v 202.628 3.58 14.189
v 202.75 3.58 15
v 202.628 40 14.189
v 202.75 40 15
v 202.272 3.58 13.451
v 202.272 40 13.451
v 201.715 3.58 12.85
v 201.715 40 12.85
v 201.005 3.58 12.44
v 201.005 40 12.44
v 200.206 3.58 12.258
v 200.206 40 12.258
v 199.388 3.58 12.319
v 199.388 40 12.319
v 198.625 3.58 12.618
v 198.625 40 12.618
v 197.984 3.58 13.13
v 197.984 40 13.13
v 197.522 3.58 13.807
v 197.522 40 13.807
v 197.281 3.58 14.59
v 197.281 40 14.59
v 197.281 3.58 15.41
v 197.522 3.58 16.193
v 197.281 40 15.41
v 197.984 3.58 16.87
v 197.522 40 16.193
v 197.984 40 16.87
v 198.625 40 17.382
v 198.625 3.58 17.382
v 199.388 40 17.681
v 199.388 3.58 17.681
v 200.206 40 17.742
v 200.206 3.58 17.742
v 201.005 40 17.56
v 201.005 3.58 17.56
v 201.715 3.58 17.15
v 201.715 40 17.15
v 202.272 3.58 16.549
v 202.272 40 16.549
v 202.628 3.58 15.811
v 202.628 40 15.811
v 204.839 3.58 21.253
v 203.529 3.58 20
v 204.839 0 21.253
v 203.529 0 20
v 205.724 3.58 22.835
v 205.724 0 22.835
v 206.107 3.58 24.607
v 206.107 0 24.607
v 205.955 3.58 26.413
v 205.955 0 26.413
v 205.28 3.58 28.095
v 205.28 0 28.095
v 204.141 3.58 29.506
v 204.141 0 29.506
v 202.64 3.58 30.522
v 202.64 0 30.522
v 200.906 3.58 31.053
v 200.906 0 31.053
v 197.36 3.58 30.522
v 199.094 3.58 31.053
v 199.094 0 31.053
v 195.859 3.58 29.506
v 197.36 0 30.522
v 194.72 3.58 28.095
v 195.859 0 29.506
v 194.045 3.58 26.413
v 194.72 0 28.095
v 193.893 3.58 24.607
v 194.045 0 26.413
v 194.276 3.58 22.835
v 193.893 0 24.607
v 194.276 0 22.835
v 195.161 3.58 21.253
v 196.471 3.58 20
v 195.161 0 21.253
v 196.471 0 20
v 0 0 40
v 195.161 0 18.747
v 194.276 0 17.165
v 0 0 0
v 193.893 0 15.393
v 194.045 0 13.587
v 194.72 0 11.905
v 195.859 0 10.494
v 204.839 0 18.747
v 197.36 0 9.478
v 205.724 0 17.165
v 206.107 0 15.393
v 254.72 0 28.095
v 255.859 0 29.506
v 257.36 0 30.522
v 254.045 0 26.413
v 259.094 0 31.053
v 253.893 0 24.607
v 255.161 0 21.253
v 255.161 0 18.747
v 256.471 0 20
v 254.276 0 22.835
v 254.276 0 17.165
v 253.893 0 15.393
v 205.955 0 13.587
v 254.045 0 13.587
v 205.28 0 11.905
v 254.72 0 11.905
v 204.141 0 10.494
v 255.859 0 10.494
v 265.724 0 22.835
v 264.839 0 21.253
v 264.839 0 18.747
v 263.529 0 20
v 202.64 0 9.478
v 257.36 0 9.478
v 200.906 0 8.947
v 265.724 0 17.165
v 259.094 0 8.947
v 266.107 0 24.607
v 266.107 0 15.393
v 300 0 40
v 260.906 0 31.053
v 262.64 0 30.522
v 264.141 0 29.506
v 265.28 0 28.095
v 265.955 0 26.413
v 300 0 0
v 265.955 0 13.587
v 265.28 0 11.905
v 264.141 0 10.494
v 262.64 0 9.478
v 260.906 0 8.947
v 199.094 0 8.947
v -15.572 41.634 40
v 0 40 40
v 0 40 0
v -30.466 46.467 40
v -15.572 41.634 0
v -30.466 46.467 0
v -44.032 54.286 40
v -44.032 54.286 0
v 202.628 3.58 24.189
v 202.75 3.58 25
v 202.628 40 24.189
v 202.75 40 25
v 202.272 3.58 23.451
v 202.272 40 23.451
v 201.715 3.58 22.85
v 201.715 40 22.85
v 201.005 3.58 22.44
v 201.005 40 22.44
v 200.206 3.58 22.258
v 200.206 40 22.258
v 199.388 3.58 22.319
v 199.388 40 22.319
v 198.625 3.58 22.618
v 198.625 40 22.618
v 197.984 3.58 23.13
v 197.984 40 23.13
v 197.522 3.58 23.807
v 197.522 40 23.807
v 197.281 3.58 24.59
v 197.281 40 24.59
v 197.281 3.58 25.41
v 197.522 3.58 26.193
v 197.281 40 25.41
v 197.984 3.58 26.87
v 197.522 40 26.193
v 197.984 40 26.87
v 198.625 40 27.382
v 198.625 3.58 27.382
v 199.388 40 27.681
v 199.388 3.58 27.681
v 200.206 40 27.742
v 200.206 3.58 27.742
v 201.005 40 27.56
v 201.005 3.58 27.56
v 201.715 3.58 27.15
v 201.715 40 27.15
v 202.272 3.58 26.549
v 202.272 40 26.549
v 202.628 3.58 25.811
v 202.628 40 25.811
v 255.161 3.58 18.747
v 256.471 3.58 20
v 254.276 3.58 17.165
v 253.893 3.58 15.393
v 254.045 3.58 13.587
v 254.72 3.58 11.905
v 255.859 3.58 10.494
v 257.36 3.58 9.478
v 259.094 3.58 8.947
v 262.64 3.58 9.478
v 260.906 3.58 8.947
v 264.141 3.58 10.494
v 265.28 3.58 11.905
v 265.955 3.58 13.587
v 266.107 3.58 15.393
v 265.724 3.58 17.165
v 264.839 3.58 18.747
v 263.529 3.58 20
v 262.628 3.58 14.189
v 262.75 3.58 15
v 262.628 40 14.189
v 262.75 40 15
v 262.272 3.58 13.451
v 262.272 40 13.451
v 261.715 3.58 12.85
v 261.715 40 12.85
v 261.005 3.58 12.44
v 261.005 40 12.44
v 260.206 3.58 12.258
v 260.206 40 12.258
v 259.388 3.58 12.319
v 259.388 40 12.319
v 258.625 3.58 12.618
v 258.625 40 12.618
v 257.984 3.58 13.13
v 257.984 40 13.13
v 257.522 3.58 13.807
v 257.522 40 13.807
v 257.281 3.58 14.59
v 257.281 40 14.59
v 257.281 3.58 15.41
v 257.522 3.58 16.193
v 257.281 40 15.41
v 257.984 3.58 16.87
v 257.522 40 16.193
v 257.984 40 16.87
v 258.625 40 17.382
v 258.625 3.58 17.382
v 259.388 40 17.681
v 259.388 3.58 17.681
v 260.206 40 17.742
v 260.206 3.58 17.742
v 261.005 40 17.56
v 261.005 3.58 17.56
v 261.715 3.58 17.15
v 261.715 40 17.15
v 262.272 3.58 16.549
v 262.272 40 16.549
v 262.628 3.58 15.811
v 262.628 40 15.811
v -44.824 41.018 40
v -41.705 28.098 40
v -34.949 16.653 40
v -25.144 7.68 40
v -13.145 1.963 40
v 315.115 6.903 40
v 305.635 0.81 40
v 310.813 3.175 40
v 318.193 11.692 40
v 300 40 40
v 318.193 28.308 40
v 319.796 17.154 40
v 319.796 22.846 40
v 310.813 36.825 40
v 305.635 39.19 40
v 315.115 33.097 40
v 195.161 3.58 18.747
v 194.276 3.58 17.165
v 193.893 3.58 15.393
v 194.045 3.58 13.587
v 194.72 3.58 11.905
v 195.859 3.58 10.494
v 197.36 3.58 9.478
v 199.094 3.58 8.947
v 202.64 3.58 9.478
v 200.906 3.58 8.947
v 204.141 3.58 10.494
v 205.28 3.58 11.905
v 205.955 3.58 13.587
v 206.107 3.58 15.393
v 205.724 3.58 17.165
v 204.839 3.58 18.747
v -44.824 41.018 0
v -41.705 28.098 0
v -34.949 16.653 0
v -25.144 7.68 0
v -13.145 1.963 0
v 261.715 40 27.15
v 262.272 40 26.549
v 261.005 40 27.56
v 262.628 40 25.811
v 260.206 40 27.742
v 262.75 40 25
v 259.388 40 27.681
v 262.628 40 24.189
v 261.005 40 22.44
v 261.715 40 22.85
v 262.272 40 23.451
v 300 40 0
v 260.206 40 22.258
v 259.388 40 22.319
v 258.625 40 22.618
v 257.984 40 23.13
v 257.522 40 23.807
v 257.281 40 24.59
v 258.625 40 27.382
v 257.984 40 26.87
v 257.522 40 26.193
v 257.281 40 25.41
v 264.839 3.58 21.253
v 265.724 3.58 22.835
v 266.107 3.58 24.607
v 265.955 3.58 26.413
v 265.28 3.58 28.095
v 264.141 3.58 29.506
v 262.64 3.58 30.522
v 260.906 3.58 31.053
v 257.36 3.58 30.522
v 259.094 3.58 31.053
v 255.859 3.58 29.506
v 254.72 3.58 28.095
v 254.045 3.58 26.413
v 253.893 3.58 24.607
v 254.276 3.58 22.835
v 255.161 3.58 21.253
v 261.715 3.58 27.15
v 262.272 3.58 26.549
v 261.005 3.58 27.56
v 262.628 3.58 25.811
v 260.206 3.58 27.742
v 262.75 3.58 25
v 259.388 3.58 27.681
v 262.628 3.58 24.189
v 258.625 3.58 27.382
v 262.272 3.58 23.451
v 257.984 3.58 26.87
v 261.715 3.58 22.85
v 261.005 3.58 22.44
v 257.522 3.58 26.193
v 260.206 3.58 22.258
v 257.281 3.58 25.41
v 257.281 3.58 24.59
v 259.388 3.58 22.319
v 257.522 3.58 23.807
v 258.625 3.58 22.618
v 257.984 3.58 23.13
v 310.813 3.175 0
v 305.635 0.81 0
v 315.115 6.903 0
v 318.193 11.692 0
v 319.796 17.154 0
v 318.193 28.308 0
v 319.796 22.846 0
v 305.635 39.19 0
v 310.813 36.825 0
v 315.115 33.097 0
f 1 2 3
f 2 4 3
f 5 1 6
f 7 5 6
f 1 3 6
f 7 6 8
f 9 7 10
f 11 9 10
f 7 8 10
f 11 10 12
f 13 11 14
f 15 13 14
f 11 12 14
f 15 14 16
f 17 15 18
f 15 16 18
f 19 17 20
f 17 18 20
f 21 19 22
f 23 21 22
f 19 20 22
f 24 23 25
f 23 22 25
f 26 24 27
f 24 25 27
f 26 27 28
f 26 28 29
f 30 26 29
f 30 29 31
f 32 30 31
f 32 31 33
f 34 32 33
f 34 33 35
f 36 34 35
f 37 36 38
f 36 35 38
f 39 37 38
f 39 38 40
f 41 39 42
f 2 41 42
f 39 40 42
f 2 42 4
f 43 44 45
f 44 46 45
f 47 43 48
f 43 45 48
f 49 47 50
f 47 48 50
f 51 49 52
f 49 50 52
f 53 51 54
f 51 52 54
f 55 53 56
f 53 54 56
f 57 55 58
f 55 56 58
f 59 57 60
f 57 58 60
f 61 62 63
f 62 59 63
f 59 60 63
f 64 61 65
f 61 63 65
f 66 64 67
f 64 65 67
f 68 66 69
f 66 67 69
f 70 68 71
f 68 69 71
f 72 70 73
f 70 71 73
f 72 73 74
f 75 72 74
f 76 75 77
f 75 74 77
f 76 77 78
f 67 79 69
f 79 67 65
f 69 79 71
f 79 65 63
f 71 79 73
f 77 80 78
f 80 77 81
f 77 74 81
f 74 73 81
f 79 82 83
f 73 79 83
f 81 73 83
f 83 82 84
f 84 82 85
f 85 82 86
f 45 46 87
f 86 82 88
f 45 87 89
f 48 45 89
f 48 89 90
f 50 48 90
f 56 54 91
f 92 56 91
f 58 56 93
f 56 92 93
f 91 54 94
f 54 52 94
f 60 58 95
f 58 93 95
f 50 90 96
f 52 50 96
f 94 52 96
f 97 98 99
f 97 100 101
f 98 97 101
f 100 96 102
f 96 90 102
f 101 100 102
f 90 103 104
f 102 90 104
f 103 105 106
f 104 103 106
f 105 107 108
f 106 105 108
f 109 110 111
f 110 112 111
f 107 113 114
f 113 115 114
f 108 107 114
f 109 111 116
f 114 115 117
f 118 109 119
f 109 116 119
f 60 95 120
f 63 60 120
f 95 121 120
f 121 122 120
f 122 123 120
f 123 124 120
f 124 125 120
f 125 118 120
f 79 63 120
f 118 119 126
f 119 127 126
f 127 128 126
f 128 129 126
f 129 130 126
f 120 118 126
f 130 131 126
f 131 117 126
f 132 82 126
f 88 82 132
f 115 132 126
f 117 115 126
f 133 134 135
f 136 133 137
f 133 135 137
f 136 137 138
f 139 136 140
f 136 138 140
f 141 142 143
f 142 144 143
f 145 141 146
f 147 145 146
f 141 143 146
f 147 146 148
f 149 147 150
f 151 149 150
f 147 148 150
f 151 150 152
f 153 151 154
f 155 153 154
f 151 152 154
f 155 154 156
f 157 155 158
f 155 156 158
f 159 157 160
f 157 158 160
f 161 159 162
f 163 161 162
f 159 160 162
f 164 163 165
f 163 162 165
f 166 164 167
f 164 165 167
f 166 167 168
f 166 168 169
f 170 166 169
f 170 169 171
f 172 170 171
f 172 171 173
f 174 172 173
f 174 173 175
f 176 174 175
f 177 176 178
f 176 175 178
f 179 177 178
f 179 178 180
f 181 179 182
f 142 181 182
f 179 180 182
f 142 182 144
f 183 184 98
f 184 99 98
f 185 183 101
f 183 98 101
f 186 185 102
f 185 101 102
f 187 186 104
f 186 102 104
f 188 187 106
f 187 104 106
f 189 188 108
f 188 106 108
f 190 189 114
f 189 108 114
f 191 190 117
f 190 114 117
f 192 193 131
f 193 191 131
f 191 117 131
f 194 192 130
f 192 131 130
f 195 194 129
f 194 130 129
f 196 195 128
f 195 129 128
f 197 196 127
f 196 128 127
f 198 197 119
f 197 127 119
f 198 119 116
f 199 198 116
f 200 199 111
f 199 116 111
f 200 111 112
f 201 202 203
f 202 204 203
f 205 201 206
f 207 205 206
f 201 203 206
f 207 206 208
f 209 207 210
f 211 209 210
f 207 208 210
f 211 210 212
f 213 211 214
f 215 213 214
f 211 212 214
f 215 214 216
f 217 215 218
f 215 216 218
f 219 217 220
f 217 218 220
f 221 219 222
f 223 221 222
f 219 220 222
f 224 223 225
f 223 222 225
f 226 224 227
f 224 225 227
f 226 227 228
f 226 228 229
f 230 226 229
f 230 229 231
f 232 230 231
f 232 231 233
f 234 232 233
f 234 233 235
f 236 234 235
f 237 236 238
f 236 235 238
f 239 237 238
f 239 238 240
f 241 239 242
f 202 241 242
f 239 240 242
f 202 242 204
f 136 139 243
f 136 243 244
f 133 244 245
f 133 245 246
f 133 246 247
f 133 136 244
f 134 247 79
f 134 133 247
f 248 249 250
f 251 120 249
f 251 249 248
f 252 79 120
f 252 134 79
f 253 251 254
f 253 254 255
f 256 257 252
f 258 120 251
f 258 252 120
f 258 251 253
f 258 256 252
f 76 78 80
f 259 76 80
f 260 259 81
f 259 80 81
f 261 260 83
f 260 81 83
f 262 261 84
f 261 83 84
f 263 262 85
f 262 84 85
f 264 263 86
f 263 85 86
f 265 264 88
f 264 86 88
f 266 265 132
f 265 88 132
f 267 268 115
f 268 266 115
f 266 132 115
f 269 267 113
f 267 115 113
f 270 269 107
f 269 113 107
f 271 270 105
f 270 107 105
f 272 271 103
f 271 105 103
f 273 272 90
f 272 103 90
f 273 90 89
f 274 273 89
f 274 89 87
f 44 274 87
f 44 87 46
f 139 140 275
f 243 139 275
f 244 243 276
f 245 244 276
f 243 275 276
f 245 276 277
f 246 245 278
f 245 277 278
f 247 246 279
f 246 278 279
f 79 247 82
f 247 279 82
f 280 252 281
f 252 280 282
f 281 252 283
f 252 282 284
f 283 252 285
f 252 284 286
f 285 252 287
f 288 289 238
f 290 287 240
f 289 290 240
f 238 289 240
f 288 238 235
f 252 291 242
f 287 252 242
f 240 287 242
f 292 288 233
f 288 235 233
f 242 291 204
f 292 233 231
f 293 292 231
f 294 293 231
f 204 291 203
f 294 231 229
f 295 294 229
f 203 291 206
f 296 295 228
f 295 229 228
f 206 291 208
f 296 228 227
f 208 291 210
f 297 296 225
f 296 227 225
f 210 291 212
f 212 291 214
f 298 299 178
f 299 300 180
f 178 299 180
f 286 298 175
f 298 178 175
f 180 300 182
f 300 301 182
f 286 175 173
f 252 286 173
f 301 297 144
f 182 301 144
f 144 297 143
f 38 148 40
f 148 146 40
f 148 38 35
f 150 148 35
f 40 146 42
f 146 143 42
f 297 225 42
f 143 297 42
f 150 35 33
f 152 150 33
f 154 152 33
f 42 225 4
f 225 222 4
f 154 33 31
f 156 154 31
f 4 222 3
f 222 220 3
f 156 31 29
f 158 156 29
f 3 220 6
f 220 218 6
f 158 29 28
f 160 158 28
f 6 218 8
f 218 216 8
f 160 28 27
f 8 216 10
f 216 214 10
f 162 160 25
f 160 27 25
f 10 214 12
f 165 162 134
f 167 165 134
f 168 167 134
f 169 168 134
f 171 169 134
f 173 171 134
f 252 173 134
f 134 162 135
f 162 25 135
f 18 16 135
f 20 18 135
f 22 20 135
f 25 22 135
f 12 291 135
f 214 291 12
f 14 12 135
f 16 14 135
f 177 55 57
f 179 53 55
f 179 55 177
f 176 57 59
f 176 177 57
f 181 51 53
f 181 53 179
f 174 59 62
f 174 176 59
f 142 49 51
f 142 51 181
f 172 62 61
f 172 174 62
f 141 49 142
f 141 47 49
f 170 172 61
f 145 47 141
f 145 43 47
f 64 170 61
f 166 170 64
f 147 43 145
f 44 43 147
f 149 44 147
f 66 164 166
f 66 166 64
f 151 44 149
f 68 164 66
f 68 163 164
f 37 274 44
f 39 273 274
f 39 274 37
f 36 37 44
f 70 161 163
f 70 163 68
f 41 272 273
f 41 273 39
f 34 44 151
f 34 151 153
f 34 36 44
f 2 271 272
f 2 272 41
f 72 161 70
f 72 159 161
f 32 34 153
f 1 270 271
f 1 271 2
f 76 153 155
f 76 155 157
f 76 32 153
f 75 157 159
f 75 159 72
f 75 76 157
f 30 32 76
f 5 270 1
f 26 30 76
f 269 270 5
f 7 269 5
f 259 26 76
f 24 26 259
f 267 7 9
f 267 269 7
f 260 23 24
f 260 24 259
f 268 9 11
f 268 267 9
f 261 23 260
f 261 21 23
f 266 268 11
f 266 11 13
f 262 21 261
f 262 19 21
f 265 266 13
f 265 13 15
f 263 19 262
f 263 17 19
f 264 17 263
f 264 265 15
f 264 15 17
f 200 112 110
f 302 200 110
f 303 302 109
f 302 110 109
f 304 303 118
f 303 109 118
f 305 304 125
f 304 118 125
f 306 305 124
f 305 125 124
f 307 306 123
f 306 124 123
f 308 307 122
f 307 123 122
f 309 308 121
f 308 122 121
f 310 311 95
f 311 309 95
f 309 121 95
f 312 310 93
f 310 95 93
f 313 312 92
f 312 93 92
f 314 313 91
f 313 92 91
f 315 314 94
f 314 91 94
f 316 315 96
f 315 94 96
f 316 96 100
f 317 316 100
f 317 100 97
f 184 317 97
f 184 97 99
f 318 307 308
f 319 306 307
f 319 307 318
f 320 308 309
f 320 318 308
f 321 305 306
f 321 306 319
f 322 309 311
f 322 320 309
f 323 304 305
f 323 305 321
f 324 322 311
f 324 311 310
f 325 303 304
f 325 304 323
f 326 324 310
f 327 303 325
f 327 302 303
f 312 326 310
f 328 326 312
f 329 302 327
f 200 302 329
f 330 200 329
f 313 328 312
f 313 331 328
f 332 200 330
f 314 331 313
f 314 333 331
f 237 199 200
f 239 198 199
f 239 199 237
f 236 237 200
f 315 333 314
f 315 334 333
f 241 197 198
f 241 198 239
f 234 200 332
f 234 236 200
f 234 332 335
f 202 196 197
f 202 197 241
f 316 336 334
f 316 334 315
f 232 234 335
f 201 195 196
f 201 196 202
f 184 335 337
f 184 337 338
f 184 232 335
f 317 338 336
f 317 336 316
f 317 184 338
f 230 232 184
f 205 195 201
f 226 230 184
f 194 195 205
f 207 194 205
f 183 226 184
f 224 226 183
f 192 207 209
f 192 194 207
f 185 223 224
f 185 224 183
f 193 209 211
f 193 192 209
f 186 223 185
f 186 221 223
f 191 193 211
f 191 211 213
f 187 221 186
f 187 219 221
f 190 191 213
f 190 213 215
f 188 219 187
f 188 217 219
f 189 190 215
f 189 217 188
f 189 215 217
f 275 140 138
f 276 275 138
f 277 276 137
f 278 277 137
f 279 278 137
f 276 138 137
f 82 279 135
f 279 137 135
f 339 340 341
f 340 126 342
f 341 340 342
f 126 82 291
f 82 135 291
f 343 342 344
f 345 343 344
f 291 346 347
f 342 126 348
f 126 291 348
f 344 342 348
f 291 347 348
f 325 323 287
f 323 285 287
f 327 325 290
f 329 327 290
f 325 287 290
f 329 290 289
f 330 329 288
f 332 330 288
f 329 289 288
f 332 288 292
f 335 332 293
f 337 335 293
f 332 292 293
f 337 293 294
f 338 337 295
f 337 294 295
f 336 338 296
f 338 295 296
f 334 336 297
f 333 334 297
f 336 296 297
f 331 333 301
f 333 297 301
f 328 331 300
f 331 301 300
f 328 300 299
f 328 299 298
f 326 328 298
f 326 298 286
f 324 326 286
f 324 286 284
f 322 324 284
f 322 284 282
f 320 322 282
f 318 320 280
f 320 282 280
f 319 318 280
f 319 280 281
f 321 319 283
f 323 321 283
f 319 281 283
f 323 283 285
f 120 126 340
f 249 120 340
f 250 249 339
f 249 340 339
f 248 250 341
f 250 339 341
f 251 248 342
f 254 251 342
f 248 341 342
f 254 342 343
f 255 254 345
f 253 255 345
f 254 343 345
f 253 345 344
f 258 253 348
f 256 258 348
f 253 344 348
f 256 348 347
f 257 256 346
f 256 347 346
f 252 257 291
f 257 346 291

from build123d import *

# Parameters (mm, degrees)
BOSS_EXTRUDE1_DEPTH                     = 40
CBORE_FOR_M5_HEX_HEAD_BOLT3_D           = 5.5
CBORE_FOR_M5_HEX_HEAD_BOLT3_CBORE_D     = 12.24
CBORE_FOR_M5_HEX_HEAD_BOLT3_CBORE_DEPTH = 3.58


with BuildPart() as part:
    # Sketch1 → Boss-Extrude1 (new body)
    with BuildSketch(Plane.XY):
        with BuildLine():
            Line((0, 0), (300, 0))
            ThreePointArc((300, 0), (320, 20), (300, 40))
            Line((300, 40), (0, 40))
            ThreePointArc((0, 40), (-23.145502494, 43.660770159), (-44.031528593, 54.285714286))
            ThreePointArc((-44.031528593, 54.285714286), (-34.948942351, 16.652664524), (0, 0))
        make_face()
    extrude(amount=BOSS_EXTRUDE1_DEPTH)

    # CBORE for M5 Hex Head Bolt3 (through all)
    with Locations(Plane(origin=(0, 0, 0), x_dir=(-1, 0, 0), z_dir=(0, -1, 0))):
        with Locations((-260, -15), (-260, -25), (-200, -25), (-200, -15)):
            CounterBoreHole(CBORE_FOR_M5_HEX_HEAD_BOLT3_D / 2, CBORE_FOR_M5_HEX_HEAD_BOLT3_CBORE_D / 2, CBORE_FOR_M5_HEX_HEAD_BOLT3_CBORE_DEPTH)


solid = part.part
